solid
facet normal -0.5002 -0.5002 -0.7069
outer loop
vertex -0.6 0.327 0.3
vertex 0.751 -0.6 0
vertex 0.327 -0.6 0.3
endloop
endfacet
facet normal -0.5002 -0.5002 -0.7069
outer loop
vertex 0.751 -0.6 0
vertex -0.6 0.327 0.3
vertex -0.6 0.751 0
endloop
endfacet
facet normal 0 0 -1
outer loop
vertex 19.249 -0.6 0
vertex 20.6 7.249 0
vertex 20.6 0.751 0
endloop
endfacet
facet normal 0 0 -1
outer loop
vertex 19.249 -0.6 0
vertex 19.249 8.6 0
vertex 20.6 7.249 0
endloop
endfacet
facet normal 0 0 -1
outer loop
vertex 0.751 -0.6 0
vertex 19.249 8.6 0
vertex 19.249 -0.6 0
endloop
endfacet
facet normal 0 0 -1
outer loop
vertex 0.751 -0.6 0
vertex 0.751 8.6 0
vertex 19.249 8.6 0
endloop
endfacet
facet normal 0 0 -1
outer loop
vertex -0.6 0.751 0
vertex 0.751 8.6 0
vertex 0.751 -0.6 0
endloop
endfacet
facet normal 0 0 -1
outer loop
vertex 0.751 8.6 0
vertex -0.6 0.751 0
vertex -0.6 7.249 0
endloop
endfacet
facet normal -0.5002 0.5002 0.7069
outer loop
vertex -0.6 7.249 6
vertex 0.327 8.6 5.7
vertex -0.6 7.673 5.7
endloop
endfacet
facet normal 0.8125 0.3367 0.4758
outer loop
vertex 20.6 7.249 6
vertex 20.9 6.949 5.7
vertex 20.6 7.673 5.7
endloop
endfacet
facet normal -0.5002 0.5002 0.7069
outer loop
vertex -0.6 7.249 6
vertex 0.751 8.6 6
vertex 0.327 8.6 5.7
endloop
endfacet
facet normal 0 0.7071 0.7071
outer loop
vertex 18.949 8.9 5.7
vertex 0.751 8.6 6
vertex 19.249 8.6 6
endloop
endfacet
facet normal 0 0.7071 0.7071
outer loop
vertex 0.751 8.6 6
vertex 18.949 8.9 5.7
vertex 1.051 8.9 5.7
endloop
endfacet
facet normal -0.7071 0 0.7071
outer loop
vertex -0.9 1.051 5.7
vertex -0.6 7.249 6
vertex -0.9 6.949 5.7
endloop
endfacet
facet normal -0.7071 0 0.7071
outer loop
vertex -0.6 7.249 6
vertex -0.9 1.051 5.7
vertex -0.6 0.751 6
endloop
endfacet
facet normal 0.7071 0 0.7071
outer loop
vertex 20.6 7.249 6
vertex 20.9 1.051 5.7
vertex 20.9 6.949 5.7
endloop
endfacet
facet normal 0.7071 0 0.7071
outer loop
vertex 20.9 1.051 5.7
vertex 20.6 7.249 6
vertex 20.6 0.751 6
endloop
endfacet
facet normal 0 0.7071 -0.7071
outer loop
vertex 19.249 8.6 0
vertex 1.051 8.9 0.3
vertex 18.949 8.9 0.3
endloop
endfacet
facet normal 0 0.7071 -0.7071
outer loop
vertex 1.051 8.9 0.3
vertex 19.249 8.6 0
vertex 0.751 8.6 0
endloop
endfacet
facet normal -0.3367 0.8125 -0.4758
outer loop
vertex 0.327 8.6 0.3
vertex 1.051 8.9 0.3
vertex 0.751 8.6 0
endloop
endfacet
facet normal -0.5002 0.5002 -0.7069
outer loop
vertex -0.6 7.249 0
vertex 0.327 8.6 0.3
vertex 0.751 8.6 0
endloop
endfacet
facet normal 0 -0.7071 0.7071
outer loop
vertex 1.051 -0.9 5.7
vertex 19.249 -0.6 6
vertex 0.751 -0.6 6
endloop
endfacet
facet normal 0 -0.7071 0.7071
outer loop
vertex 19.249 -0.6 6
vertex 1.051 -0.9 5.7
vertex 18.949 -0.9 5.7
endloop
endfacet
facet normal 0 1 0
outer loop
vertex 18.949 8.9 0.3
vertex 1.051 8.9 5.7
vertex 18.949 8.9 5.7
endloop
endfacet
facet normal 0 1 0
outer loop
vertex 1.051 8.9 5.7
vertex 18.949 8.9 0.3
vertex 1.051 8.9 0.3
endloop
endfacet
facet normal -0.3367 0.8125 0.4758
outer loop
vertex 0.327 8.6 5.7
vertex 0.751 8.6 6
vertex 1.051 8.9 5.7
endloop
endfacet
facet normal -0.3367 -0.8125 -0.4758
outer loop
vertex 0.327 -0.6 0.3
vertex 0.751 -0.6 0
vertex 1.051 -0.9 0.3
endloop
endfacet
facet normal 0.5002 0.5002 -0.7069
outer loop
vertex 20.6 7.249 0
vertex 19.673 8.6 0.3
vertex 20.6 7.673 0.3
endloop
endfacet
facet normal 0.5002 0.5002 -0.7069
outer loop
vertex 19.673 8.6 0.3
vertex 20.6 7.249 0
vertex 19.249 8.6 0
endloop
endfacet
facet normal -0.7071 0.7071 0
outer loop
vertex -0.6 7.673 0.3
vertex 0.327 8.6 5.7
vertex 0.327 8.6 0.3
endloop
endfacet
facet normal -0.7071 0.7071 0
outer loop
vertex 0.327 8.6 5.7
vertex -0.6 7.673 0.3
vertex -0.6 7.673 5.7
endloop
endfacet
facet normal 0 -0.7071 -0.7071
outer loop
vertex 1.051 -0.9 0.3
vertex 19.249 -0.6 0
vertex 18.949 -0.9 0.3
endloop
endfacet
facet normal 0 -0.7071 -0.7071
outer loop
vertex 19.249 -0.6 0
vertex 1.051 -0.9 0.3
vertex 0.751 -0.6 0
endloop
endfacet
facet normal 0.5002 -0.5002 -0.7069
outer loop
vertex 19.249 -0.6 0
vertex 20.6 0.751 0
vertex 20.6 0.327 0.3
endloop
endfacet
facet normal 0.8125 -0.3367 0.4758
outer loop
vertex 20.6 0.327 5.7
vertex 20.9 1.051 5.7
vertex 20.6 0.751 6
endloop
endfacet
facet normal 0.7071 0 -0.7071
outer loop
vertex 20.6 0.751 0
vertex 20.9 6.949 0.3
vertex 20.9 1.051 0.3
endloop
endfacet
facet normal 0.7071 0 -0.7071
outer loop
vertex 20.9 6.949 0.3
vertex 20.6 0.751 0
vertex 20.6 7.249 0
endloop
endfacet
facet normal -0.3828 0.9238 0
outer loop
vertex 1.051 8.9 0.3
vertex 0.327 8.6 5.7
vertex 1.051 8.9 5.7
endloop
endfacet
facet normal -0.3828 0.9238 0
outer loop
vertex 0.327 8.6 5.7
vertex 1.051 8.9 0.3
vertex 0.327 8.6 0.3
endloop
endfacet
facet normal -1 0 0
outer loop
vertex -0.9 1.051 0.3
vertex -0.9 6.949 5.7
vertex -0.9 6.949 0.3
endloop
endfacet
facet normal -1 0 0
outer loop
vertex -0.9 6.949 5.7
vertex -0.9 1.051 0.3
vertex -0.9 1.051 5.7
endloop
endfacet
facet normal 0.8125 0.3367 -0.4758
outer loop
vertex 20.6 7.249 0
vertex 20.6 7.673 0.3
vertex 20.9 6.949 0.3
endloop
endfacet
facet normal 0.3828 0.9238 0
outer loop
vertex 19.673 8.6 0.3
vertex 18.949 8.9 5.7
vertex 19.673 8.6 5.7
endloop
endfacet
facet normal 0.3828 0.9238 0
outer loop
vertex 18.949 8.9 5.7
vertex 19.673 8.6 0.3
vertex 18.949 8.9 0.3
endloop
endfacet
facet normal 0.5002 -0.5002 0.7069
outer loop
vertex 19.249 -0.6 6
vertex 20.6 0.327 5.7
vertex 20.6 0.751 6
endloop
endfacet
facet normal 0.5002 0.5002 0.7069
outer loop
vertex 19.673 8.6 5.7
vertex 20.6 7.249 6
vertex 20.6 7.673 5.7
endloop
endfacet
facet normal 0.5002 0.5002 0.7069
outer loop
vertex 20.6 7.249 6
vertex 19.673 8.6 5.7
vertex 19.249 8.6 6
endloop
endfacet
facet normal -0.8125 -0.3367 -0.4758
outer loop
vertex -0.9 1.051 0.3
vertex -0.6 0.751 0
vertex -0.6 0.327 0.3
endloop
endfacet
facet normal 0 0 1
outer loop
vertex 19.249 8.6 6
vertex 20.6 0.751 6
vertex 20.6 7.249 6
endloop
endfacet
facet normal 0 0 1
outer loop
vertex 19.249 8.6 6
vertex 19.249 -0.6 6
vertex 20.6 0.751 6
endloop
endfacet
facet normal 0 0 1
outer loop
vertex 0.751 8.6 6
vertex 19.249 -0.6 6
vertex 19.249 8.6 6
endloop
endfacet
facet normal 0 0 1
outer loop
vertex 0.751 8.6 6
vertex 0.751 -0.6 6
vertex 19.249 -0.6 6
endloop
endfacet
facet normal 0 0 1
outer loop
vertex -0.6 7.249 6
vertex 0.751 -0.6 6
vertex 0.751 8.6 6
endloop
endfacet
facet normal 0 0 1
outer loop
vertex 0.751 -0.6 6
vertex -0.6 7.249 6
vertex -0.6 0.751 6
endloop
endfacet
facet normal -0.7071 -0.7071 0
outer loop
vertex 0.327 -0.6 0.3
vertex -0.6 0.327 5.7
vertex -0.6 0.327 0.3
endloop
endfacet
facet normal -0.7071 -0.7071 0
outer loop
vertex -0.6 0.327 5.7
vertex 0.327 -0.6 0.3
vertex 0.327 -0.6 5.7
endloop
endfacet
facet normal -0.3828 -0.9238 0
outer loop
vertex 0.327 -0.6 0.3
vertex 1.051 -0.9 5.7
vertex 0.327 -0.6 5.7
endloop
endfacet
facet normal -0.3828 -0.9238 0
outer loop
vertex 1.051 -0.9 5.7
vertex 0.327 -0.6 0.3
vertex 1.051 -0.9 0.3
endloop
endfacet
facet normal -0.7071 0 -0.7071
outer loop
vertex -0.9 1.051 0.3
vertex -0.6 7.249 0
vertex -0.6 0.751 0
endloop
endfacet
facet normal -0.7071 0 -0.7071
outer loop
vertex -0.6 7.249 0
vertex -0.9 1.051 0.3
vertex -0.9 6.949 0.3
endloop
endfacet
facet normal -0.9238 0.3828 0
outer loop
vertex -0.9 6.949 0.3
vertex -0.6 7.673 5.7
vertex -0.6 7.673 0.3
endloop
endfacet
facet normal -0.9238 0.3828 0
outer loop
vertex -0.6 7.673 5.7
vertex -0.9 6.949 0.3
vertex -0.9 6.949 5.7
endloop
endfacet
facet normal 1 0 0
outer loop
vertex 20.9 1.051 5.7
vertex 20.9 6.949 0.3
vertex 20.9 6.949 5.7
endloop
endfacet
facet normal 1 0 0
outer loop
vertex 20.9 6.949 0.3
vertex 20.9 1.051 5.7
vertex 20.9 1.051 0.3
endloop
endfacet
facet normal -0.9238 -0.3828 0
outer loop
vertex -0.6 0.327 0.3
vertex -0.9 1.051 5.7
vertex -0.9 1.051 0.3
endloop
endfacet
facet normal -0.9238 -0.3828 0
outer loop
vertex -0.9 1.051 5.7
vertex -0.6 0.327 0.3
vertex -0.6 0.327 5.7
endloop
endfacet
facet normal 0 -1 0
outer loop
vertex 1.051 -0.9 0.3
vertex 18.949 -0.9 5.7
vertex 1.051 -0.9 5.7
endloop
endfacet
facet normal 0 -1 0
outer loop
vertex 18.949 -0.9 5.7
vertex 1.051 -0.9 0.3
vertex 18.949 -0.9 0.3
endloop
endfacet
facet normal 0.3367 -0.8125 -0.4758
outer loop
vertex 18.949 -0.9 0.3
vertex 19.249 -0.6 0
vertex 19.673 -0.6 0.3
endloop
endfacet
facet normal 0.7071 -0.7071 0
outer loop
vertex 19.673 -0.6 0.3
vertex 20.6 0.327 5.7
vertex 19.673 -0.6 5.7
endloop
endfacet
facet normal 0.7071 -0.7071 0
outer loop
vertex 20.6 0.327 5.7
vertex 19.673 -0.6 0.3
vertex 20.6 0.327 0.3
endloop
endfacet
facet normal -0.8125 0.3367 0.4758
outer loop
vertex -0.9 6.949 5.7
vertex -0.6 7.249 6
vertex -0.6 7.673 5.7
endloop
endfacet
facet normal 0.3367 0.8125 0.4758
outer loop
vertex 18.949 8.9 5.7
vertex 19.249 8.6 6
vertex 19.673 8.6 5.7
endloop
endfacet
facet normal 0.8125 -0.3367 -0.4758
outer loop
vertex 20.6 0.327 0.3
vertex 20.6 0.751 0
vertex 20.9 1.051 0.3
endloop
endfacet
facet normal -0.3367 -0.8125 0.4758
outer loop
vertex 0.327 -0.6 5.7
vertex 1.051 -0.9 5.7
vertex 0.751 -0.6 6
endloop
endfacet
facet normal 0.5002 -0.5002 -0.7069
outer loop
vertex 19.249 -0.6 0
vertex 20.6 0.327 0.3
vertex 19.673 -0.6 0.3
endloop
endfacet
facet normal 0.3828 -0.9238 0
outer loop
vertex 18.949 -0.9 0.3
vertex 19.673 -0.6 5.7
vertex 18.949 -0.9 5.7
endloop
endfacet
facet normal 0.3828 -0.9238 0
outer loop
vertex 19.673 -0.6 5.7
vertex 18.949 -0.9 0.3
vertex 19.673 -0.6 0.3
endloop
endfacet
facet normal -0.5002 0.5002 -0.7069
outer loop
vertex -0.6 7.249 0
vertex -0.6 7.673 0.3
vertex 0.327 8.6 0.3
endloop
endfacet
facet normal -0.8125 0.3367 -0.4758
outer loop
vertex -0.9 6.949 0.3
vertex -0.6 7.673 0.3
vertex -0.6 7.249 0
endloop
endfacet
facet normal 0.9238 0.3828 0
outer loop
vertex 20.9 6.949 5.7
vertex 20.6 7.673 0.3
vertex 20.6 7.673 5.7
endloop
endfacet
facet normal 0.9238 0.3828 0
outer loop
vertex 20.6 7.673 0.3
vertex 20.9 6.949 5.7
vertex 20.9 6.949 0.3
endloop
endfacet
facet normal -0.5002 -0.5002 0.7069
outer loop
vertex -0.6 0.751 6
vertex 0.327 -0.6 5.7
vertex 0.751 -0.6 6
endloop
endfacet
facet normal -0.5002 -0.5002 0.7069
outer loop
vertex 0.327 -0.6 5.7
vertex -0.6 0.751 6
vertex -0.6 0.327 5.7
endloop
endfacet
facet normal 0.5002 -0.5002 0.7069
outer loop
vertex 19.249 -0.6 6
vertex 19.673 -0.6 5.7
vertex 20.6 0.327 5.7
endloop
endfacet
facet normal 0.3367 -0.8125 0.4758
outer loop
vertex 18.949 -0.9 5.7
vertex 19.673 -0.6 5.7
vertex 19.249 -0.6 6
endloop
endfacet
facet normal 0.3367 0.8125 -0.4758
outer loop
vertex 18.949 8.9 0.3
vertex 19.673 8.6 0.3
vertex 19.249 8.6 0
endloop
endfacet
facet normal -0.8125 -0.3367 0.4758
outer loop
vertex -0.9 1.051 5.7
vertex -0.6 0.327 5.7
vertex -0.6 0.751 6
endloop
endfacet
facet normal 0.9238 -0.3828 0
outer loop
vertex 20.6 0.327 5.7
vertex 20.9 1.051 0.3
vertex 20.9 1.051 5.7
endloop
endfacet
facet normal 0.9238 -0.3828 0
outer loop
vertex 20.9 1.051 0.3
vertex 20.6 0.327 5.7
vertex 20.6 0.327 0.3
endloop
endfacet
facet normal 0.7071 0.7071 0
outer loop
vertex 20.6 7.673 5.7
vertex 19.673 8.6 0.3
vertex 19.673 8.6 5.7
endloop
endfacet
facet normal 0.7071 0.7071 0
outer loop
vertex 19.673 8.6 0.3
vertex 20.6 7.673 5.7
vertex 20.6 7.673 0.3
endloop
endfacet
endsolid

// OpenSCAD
// file: ../functions/vectors2D.scad
/* * * * * * * * * * * * * * * * * * * * * * * * * * * * * * * * * * * * *\
 * Copyright (C) Claus Schrammel <claus@f05fk.net>                       *
 *                                                                       *
 * This program is free software: you can redistribute it and/or modify  *
 * it under the terms of the GNU General Public License as published by  *
 * the Free Software Foundation, either version 3 of the License, or     *
 * (at your option) any later version.                                   *
 *                                                                       *
 * This program is distributed in the hope that it will be useful,       *
 * but WITHOUT ANY WARRANTY; without even the implied warranty of        *
 * MERCHANTABILITY or FITNESS FOR A PARTICULAR PURPOSE.  See the         *
 * GNU General Public License for more details.                          *
 *                                                                       *
 * You should have received a copy of the GNU General Public License     *
 * along with this program.  If not, see <http://www.gnu.org/licenses/>. *
 *                                                                       *
 * SPDX-License-Identifier: GPL-3.0-or-later                             *
\* * * * * * * * * * * * * * * * * * * * * * * * * * * * * * * * * * * * */

include <utils.scad>

function normal_vector_2D(vector) = [-vector.y, vector.x];
function unit_vector_2D(vector) = vector / norm(vector);

/*
 * Calculates the coefficient for v1 to get from p1 to the intersection point of the two lines p1/v1 and p2/v2:
 * intersection_point = p1 + v1 * intersection_coefficient1.
 */
function intersection_coefficient1(p1, v1, p2, v2) = ( v2.x * (p1.y - p2.y) - v2.y * (p1.x - p2.x) ) / (v1.x * v2.y - v1.y * v2.x);

/*
 * Calculates the coefficient for v2 to get from p2 to the intersection point of the two lines p1/v1 and p2/v2:
 * intersection_point = p2 + v2 * intersection_coefficient2.
 */
function intersection_coefficient2(p1, v1, p2, v2) = intersection_coefficient1(p2, v2, p1, v1);

/*
 * Calculates the intersection point of the two lines p1/v1 and p2/v2.
 */
function intersection_point(p1, v1, p2, v2) = p1 + v1 * intersection_coefficient1(p1, v1, p2, v2);
// file: ../functions/utils.scad
/* * * * * * * * * * * * * * * * * * * * * * * * * * * * * * * * * * * * *\
 * Copyright (C) Claus Schrammel <claus@f05fk.net>                       *
 *                                                                       *
 * This program is free software: you can redistribute it and/or modify  *
 * it under the terms of the GNU General Public License as published by  *
 * the Free Software Foundation, either version 3 of the License, or     *
 * (at your option) any later version.                                   *
 *                                                                       *
 * This program is distributed in the hope that it will be useful,       *
 * but WITHOUT ANY WARRANTY; without even the implied warranty of        *
 * MERCHANTABILITY or FITNESS FOR A PARTICULAR PURPOSE.  See the         *
 * GNU General Public License for more details.                          *
 *                                                                       *
 * You should have received a copy of the GNU General Public License     *
 * along with this program.  If not, see <http://www.gnu.org/licenses/>. *
 *                                                                       *
 * SPDX-License-Identifier: GPL-3.0-or-later                             *
\* * * * * * * * * * * * * * * * * * * * * * * * * * * * * * * * * * * * */

// the modulo operator % creates negative results for negative inputs n
function modulo(n, m) = ((n % m) + m) % m;

function cyclic_array(array, index) = array[modulo(index, len(array))];
// file: ../functions/polygons.scad
/* * * * * * * * * * * * * * * * * * * * * * * * * * * * * * * * * * * * *\
 * Copyright (C) Claus Schrammel <claus@f05fk.net>                       *
 *                                                                       *
 * This program is free software: you can redistribute it and/or modify  *
 * it under the terms of the GNU General Public License as published by  *
 * the Free Software Foundation, either version 3 of the License, or     *
 * (at your option) any later version.                                   *
 *                                                                       *
 * This program is distributed in the hope that it will be useful,       *
 * but WITHOUT ANY WARRANTY; without even the implied warranty of        *
 * MERCHANTABILITY or FITNESS FOR A PARTICULAR PURPOSE.  See the         *
 * GNU General Public License for more details.                          *
 *                                                                       *
 * You should have received a copy of the GNU General Public License     *
 * along with this program.  If not, see <http://www.gnu.org/licenses/>. *
 *                                                                       *
 * SPDX-License-Identifier: GPL-3.0-or-later                             *
\* * * * * * * * * * * * * * * * * * * * * * * * * * * * * * * * * * * * */

include <utils.scad>
include <vectors2D.scad>

/*
 * Shrinks the polygon by moving the edges "inwards" by the given distance.
 * The points need to be given in the counter-clockwise order, i.e. applying the
 * right-hand rule with the thumb pointing in the z direction.
 */
function shrink_edges(points, distance) =
    [ for (i = [0 : 1 : len(points) - 1])
        let (p1 = cyclic_array(points, i - 1), p2 = cyclic_array(points, i), p3 = cyclic_array(points, i + 1),
                v1 = p2 - p1, v2 = p3 - p2,
                n1 = unit_vector_2D(normal_vector_2D(v1)), n2 = unit_vector_2D(normal_vector_2D(v2)))
            intersection_point(p1 + n1 * distance, v1, p2 + n2 * distance, v2)
    ];

/*
 * Grows the polygon by moving the edges "outwards" by the given distance.
 * The points need to be given in the counter-clockwise order, i.e. applying the
 * right-hand rule with the thumb pointing in the z direction.
 */
function grow_edges(points, distance) = shrink_edges(points, -distance);

/*
 * Flattens the corners of the polygon by cutting off at the intersection points where one of the edges
 * is moved "inwards" by the given distance, while the other edge is not, and vice-versa.
 * The points need to be given in the counter-clockwise order, i.e. applying the
 * right-hand rule with the thumb pointing in the z direction.
 */
function flatten_corners(points, distance) = 
    [ for (i = [0 : 1 : len(points) - 1])
        let (p1 = cyclic_array(points, i - 1), p2 = cyclic_array(points, i), p3 = cyclic_array(points, i + 1),
                v1 = p2 - p1, v2 = p3 - p2,
                n1 = unit_vector_2D(normal_vector_2D(v1)), n2 = unit_vector_2D(normal_vector_2D(v2)))
            each [
                intersection_point(p1, v1, p2 + n2 * distance, v2),
                intersection_point(p1 + n1 * distance, v1, p2, v2)
            ]
    ];
// main file
/* * * * * * * * * * * * * * * * * * * * * * * * * * * * * * * * * * * * *\
 * Copyright (C) Claus Schrammel <claus@f05fk.net>                       *
 *                                                                       *
 * This program is free software: you can redistribute it and/or modify  *
 * it under the terms of the GNU General Public License as published by  *
 * the Free Software Foundation, either version 3 of the License, or     *
 * (at your option) any later version.                                   *
 *                                                                       *
 * This program is distributed in the hope that it will be useful,       *
 * but WITHOUT ANY WARRANTY; without even the implied warranty of        *
 * MERCHANTABILITY or FITNESS FOR A PARTICULAR PURPOSE.  See the         *
 * GNU General Public License for more details.                          *
 *                                                                       *
 * You should have received a copy of the GNU General Public License     *
 * along with this program.  If not, see <http://www.gnu.org/licenses/>. *
 *                                                                       *
 * SPDX-License-Identifier: GPL-3.0-or-later                             *
\* * * * * * * * * * * * * * * * * * * * * * * * * * * * * * * * * * * * */

use <../functions/polygons.scad>;
use <../modules/PrismaChamfered.scad>;

length = 20;
width = 8;
height = 6;
thick = 0.9;
chamfer = 0.3;

points = flatten_corners(points = [[0, 0], [length, 0], [length, width], [0, width]], distance = 1);

difference() {
    PrismaChamfered(grow_edges(points, thick), height = height, chamfer = chamfer);
    PrismaChamfered(           points,         height = height, chamfer = chamfer, invert_bottom = true, invert_top = true);
}
